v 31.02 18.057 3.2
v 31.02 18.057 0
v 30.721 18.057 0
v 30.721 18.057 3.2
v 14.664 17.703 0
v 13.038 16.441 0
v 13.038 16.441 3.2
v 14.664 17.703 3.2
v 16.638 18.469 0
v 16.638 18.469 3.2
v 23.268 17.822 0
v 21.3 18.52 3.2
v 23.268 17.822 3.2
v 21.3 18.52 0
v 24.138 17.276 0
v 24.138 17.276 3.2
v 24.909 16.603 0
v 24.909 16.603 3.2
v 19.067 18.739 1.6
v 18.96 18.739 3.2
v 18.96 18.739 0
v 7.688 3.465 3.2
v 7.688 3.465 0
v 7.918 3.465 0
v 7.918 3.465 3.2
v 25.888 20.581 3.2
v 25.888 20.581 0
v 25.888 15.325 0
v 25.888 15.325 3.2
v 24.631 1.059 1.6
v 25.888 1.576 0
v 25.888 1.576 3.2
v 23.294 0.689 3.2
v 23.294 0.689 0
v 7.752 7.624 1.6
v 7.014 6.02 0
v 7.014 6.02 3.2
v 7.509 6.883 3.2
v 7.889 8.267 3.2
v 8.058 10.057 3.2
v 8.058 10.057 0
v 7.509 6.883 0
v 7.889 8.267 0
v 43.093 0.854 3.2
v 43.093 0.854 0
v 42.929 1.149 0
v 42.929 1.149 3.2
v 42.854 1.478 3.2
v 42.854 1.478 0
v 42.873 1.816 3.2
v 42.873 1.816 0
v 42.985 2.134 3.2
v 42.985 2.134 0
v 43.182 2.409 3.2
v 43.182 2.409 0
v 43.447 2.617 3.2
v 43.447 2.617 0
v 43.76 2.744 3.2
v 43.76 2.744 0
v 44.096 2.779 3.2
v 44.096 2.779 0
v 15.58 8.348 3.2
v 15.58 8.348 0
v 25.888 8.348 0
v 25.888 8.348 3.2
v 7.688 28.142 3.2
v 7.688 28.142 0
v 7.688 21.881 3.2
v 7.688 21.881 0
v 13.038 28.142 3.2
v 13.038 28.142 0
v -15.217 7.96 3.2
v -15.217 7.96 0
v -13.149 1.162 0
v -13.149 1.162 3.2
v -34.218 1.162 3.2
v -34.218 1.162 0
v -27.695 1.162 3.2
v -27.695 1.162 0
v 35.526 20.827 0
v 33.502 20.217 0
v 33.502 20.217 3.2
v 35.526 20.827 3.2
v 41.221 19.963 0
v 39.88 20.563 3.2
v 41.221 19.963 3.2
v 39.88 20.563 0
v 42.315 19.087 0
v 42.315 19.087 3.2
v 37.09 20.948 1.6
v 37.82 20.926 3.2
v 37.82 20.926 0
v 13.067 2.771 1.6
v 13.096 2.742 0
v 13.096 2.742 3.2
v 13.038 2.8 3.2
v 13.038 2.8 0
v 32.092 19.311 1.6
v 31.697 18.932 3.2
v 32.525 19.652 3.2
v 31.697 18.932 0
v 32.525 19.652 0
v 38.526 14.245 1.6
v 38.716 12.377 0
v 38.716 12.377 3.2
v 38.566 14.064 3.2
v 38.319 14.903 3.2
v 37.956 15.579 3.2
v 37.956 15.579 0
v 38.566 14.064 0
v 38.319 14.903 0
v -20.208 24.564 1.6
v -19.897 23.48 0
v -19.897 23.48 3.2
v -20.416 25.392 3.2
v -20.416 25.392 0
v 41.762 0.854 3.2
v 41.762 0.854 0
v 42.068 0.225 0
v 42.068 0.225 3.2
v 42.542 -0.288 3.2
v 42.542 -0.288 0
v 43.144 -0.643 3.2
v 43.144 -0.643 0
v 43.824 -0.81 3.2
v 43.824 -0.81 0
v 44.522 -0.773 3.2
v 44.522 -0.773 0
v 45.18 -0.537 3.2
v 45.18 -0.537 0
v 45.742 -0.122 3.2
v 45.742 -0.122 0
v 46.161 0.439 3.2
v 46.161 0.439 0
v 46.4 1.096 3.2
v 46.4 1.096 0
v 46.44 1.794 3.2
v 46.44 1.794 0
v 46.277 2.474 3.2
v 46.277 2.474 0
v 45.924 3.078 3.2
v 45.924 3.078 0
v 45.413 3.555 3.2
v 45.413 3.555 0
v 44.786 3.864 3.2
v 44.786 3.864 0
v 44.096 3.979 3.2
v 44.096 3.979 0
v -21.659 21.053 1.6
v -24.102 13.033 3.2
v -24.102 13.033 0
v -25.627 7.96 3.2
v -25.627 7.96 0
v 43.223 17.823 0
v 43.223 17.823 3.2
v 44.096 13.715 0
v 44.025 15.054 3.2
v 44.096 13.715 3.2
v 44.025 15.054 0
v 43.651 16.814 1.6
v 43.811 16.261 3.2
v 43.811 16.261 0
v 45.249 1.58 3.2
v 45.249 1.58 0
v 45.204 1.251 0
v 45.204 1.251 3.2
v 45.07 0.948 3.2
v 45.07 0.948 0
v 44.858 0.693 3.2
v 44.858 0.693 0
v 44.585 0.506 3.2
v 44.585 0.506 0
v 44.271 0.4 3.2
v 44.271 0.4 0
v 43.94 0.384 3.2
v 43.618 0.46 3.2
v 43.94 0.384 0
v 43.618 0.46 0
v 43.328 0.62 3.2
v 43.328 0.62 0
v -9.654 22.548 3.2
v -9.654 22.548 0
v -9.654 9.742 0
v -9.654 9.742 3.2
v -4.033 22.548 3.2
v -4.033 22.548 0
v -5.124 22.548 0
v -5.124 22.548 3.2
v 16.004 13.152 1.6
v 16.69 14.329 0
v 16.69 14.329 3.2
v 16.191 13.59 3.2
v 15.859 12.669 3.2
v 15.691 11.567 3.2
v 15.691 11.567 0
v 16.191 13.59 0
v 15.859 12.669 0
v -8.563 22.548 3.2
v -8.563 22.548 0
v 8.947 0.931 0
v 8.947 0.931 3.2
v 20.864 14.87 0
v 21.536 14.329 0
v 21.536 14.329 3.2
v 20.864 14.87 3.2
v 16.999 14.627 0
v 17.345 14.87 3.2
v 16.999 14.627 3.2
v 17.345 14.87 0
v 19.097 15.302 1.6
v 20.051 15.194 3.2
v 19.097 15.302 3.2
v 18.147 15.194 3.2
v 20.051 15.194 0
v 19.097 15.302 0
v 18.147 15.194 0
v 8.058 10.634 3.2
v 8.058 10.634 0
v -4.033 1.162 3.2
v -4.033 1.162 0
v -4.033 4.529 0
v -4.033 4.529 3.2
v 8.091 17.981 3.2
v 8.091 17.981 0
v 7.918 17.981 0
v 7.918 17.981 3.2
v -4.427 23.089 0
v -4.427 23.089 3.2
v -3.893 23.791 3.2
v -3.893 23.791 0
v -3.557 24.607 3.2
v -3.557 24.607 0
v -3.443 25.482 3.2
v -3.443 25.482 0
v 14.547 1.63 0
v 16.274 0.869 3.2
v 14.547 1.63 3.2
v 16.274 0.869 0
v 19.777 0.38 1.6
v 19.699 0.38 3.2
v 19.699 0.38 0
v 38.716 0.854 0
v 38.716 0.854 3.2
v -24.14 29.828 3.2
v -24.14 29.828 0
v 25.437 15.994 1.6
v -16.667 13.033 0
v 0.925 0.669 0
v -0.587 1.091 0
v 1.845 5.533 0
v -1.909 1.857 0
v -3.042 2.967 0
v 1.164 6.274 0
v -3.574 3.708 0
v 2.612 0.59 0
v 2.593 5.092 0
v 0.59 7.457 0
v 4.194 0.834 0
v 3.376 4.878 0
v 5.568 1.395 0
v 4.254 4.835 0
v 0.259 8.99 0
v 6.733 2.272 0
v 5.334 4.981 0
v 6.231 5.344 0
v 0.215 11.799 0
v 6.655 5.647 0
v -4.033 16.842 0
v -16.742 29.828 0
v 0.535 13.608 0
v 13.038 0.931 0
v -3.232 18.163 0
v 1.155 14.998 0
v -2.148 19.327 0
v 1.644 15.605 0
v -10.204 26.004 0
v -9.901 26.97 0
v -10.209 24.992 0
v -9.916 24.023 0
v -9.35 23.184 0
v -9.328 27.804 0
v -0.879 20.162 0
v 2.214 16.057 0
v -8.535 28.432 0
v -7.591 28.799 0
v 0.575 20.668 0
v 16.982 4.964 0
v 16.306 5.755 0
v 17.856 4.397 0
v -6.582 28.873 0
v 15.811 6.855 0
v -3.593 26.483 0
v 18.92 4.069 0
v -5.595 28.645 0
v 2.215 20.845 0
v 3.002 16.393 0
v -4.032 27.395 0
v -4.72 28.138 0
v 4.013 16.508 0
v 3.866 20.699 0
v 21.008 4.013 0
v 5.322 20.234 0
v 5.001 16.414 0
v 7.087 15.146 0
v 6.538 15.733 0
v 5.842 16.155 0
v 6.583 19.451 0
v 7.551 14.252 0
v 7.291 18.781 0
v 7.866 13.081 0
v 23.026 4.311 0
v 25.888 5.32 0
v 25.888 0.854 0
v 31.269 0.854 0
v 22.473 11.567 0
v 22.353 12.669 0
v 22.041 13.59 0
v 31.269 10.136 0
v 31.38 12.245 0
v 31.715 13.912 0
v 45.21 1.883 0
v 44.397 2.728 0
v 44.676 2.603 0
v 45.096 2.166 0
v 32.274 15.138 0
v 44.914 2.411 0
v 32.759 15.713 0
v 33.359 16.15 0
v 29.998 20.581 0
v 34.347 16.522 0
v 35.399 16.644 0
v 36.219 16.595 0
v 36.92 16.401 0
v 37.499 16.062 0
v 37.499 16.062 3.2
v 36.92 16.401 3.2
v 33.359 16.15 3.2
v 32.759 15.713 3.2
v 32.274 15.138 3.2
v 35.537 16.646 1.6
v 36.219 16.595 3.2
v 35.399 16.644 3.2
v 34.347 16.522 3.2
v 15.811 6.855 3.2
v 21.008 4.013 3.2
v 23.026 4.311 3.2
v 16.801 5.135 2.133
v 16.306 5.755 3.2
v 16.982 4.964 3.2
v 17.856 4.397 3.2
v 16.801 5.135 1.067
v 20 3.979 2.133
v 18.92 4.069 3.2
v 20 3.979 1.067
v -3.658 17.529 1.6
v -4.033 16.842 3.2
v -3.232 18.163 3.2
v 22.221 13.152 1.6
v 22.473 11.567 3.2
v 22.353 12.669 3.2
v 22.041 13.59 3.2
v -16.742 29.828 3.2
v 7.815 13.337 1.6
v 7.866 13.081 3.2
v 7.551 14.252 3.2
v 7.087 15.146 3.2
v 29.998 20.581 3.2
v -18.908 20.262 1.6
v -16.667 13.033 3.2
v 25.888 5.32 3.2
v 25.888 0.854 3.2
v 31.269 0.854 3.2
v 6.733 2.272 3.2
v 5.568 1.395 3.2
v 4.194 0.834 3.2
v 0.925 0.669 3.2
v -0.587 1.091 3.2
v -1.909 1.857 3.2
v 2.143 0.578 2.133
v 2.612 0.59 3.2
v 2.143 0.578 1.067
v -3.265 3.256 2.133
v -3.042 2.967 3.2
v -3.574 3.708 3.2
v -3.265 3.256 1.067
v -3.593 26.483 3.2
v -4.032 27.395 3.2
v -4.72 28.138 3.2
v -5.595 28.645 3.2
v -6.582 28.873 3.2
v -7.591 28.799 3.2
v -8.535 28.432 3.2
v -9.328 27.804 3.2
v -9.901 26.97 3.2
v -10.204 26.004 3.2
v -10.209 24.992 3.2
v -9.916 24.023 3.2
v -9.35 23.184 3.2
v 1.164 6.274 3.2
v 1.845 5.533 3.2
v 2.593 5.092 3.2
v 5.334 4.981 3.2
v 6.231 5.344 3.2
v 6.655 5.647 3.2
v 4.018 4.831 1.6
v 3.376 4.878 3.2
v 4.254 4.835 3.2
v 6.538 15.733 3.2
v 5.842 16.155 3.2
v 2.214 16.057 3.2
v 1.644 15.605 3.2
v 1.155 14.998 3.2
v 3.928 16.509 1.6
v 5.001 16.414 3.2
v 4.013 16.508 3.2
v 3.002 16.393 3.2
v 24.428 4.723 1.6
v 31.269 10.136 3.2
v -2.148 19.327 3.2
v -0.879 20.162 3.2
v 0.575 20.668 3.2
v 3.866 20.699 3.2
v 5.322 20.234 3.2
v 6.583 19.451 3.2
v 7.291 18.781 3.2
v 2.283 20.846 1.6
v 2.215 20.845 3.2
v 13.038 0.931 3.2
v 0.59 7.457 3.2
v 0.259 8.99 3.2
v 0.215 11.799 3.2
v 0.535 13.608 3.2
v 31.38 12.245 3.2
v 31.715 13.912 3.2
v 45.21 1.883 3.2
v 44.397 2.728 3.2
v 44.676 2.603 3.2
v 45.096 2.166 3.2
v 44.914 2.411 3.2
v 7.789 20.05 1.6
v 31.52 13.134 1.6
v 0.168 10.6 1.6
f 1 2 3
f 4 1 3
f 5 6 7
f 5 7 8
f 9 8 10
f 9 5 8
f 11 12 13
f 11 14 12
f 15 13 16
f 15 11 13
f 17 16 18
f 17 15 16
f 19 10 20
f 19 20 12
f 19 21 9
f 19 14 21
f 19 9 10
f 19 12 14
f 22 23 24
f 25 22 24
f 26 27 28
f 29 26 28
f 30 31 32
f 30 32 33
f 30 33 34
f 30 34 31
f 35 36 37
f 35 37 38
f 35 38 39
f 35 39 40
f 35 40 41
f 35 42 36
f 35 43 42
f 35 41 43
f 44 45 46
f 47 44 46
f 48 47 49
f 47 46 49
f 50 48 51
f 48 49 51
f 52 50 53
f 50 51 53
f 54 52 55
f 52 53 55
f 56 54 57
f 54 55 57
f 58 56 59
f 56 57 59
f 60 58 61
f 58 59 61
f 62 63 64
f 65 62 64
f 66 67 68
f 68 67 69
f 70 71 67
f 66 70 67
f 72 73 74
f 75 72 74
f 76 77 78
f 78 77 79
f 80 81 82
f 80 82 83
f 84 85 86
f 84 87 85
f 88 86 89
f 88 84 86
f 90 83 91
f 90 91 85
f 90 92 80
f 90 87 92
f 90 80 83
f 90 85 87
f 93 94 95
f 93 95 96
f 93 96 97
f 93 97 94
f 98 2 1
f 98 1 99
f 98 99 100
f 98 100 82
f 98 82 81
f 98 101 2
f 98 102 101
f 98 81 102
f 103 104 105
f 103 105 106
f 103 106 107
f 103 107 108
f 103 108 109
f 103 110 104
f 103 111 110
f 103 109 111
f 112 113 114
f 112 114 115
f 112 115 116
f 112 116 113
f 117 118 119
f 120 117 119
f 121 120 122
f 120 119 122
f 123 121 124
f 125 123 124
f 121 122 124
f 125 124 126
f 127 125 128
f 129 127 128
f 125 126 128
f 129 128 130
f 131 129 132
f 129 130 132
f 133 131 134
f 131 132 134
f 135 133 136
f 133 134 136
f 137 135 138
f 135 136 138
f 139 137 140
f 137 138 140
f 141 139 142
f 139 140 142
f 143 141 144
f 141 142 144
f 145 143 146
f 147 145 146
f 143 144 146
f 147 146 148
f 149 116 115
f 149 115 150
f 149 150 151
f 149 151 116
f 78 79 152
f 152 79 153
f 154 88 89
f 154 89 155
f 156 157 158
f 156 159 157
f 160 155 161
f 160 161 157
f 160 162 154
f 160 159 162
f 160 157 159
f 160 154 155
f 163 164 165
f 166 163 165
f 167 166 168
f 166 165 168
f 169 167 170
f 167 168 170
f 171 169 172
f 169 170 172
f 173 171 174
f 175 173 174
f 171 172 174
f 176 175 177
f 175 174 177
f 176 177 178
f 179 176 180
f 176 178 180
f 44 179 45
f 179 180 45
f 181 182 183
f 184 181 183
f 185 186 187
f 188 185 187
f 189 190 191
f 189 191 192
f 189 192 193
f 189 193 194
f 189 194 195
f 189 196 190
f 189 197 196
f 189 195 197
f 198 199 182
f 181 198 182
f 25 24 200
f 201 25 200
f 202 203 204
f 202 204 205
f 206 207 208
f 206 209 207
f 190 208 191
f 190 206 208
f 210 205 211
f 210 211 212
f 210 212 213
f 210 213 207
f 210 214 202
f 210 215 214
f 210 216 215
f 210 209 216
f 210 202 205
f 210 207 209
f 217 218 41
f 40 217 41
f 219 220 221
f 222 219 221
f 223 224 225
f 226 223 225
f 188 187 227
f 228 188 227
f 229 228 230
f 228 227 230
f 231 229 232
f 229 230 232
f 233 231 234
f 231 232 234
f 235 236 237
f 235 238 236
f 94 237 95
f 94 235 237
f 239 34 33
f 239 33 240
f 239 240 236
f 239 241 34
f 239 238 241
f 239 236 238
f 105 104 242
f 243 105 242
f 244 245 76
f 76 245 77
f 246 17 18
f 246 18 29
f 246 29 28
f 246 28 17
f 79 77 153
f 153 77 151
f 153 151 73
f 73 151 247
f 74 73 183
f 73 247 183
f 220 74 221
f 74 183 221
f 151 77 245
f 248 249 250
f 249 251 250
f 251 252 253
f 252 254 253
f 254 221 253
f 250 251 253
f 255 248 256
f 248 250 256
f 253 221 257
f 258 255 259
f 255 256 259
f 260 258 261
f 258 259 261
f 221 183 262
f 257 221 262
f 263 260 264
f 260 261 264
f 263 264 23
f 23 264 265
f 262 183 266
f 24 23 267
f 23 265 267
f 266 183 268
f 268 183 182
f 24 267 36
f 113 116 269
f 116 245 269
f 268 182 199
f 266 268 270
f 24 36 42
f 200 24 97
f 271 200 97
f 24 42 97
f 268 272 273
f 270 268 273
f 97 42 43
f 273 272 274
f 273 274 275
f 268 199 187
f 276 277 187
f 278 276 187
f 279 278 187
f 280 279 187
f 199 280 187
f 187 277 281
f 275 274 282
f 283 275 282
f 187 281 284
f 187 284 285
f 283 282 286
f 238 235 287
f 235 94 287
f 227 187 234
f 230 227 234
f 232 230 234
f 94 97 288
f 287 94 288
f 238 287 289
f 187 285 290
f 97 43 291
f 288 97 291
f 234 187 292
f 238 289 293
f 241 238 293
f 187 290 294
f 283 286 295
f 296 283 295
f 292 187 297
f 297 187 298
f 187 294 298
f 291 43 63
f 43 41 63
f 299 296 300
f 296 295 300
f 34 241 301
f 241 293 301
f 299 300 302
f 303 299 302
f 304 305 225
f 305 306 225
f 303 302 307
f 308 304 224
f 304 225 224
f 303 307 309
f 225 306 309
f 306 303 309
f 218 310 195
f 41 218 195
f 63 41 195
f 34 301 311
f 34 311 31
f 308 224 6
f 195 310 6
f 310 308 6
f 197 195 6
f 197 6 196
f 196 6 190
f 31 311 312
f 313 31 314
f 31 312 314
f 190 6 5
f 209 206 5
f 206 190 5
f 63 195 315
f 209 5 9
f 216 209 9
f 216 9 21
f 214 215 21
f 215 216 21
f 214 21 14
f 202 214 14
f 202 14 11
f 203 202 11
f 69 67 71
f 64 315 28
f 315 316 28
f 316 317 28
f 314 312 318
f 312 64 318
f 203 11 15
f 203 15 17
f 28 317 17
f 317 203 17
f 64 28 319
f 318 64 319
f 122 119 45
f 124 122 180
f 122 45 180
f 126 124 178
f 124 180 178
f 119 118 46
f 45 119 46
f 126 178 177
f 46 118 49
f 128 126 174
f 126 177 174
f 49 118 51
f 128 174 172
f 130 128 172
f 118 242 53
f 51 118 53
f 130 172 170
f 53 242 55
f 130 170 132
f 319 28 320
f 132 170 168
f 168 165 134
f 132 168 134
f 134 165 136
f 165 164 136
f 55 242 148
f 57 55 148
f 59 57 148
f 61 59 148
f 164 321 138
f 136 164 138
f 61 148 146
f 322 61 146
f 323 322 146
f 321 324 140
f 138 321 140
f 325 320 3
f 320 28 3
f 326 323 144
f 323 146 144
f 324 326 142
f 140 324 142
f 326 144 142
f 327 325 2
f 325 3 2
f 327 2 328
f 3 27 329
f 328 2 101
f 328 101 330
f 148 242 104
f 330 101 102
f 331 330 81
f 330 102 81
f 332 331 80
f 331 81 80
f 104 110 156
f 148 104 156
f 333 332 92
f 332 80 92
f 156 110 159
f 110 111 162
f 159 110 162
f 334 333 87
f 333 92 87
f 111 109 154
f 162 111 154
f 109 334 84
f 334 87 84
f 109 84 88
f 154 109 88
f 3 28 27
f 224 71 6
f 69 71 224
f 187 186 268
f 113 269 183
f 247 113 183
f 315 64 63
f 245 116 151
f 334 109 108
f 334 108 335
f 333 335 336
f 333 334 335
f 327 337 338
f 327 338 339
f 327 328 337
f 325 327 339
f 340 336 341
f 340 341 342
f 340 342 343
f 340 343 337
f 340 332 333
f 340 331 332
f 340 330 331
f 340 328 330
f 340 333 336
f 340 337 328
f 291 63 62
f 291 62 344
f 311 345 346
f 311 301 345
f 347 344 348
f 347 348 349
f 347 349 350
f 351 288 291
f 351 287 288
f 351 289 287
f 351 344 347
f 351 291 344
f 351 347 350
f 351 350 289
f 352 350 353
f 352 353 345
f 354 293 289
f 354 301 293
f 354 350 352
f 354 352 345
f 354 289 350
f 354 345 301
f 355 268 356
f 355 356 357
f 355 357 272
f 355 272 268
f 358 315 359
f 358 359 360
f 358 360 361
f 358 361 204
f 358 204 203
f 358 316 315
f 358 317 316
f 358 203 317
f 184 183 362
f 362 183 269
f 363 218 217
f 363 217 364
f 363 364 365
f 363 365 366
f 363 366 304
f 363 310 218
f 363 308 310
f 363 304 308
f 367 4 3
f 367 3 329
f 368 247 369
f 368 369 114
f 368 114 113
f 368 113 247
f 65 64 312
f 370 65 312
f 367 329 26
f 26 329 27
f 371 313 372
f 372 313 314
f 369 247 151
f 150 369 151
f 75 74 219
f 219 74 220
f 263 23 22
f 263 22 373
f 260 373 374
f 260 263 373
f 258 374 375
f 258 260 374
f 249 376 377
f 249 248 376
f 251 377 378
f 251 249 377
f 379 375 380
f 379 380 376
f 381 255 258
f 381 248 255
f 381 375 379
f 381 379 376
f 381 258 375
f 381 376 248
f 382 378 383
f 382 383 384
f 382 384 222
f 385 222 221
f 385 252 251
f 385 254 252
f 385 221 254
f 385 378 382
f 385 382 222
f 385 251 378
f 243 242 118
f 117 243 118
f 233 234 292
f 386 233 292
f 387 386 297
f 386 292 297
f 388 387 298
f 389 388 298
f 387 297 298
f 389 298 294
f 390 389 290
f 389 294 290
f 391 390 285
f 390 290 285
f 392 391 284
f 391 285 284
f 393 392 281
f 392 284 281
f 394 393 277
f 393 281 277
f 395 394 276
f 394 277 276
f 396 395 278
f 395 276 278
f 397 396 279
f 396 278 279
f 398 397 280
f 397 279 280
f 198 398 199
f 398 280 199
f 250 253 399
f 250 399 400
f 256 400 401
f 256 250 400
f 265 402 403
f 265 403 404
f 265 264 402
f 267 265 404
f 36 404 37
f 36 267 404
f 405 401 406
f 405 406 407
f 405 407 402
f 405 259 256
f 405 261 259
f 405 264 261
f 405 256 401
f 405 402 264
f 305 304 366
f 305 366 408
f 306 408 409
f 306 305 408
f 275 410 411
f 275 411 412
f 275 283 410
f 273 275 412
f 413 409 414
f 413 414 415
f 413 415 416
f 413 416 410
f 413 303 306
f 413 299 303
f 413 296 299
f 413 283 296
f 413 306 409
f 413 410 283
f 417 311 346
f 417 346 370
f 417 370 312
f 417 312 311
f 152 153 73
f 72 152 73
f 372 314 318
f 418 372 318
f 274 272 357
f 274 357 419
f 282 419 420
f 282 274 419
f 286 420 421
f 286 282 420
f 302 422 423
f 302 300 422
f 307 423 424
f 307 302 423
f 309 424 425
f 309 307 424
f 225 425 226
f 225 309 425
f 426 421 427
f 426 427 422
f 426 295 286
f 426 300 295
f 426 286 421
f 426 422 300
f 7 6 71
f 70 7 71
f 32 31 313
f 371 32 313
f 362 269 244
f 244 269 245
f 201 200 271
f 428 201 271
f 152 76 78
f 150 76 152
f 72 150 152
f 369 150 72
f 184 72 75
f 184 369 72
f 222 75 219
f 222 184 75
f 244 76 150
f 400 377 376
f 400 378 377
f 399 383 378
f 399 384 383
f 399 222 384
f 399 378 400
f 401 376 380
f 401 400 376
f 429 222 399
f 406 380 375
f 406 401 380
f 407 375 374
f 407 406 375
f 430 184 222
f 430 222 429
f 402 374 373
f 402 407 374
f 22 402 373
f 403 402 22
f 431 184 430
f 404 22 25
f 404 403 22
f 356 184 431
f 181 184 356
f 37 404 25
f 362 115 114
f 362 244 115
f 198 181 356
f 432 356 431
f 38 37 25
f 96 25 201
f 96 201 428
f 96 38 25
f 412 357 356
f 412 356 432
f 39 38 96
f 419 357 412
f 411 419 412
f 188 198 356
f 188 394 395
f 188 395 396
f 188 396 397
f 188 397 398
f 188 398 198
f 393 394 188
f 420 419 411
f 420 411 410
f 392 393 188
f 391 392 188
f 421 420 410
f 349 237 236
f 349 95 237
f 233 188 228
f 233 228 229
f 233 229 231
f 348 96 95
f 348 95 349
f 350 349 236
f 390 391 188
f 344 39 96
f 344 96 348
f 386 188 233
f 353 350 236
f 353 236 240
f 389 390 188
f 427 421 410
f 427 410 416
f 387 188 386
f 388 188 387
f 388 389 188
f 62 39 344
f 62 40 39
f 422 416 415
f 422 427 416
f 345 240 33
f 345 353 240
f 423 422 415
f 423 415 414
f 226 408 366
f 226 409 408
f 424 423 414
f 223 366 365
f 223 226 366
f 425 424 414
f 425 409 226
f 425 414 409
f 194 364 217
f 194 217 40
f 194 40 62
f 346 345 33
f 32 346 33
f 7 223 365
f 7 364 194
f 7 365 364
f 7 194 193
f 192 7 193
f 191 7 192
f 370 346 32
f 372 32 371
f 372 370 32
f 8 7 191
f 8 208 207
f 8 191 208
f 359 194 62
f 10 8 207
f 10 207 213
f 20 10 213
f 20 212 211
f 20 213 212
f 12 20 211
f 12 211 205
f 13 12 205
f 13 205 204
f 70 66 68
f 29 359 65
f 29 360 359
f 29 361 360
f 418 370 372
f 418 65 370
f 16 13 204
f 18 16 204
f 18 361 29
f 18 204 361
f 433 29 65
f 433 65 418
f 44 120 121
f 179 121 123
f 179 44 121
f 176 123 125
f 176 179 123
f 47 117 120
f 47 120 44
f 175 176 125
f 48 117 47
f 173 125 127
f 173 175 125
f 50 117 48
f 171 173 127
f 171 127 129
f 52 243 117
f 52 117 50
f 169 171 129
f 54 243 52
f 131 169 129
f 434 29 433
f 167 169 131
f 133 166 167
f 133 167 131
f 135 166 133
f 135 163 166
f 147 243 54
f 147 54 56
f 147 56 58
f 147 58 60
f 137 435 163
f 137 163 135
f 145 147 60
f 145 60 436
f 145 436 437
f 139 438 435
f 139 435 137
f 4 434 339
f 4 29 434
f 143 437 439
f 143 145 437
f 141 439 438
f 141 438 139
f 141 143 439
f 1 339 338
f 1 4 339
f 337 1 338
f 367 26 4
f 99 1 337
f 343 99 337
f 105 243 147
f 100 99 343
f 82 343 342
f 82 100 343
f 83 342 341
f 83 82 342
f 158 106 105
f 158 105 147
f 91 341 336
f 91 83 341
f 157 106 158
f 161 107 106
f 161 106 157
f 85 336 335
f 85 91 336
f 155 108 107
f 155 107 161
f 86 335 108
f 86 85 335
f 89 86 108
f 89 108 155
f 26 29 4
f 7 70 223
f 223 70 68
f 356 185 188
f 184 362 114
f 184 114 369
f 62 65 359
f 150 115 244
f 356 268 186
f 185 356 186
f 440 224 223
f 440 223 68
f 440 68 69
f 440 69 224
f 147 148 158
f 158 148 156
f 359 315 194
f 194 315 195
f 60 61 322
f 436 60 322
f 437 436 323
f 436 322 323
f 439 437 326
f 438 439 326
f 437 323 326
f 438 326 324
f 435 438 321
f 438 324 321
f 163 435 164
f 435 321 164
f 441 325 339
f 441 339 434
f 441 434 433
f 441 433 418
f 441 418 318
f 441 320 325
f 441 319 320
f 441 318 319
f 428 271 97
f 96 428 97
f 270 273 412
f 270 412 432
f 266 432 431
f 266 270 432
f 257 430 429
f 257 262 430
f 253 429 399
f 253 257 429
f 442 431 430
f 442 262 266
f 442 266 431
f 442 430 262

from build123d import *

# Parameters (mm, degrees)
F1_DEPTH = 4
F2_SCALE = 0.8


with BuildPart() as f1:
    # F0 (on Top) → F1 (new body)
    with BuildSketch(Plane.XY):
        with BuildLine():
            ThreePointArc((2.1488346381, 27.8940834105), (3.6881804127, 29.448172395), (4.2509673702, 31.561948359))
            ThreePointArc((4.2509673702, 31.561948359), (-2.113775964, 35.2501287717), (-2.1488346381, 27.8940834105))
            Line((-2.1488346381, 27.8940834105), (2.1488346381, 27.8940834105))
        make_face()
        with BuildLine():
            Line((2.1488346381, 27.8940834105), (-2.1488346381, 27.8940834105))
            ThreePointArc((-2.1488346381, 27.8940834105), (0, 27.3109809888), (2.1488346381, 27.8940834105))
        make_face()
        with BuildLine():
            ThreePointArc((2.1488346381, 27.8940834105), (0, 27.3109809888), (-2.1488346381, 27.8940834105))
            Line((-2.1488346381, 27.8940834105), (-3.5128553864, 27.8940834105))
            Line((-3.5128553864, 27.8940834105), (-3.5128553864, 11.8866187867))
            Line((-3.5128553864, 11.8866187867), (0.2716600963, 1.1618769495))
            Line((0.2716600963, 1.1618769495), (3.5128553864, 1.1618769495))
            Line((3.5128553864, 1.1618769495), (3.5128553864, 5.3711547468))
            add(Edge.make_bspline(
                [(3.5128553864, 5.3711547468), (2.0144434893, 8.4253364224), (2.0144434893, 13.0503994181)],
                knots=[0.2193225388, 0.2193225388, 0.2193225388, 1, 1, 1], degree=2))
            add(Edge.make_bspline(
                [(2.0144434893, 13.0503994181), (2.0144434893, 17.7014605477), (3.5128553864, 20.7618998173)],
                knots=[0, 0, 0, 0.7740986013, 0.7740986013, 0.7740986013], degree=2))
            Line((3.5128553864, 20.7618998173), (3.5128553864, 27.8940834105))
            Line((3.5128553864, 27.8940834105), (2.1488346381, 27.8940834105))
        make_face()
        Polygon((0.2716600963, 1.1618769495), (-3.5128553864, 11.8866187867), (-3.5128553864, 1.1618769495), align=None)
        Polygon((-3.5128553864, 1.1618769495), (-3.5128553864, 11.8866187867), (-12.3729065895, 36.9946576501), (-21.6200758025, 36.9946576501), (-34.2177818335, 1.1618769495), (-26.064027899, 1.1618769495), (-23.4788817761, 9.6592756858), (-10.4672399611, 9.6592756858), (-7.8820938382, 1.1618769495), align=None)
        with BuildLine():
            add(Edge.make_bspline(
                [(-12.2791852799, 16.0010843015), (-15.8640253718, 27.5444255996), (-16.3170117015, 29.0595867713)],
                knots=[0, 0, 0, 1, 1, 1], degree=2))
            Line((-12.2791852799, 16.0010843015), (-21.5732151477, 16.0010843015))
            add(Edge.make_bspline(
                [(-16.9652507595, 31.4494801659), (-17.7696920001, 28.3254365129), (-21.5732151477, 16.0010843015)],
                knots=[0, 0, 0, 1, 1, 1], degree=2))
            add(Edge.make_bspline(
                [(-16.3170117015, 29.0595867713), (-16.7699980311, 30.5747479431), (-16.9652507595, 31.4494801659)],
                knots=[0, 0, 0, 1, 1, 1], degree=2))
        make_face(mode=Mode.SUBTRACT)
        with BuildLine():
            add(Edge.make_bspline(
                [(3.5128553864, 20.7618998173), (3.9501295822, 21.6550128013), (4.5150113623, 22.4126654266)],
                knots=[0.7740986013, 0.7740986013, 0.7740986013, 1, 1, 1], degree=2))
            Line((3.5128553864, 20.7618998173), (3.5128553864, 5.3711547468))
            add(Edge.make_bspline(
                [(4.4730437896, 3.7790631505), (3.9338173299, 4.513116809), (3.5128553864, 5.3711547468)],
                knots=[0, 0, 0, 0.2193225388, 0.2193225388, 0.2193225388], degree=2))
            add(Edge.make_bspline(
                [(11.2333202911, 0.4321492281), (6.93164409, 0.4321492281), (4.4730437896, 3.7790631505)],
                knots=[0, 0, 0, 1, 1, 1], degree=2))
            add(Edge.make_bspline(
                [(18.1649643811, 4.0413604798), (15.8917208602, 0.4321492281), (11.2333202911, 0.4321492281)],
                knots=[0, 0, 0, 1, 1, 1], degree=2))
            Line((18.1649643811, 4.0413604798), (18.4517427945, 4.0413604798))
            Line((18.4517427945, 4.0413604798), (19.7387483571, 0.8728087414))
            Line((19.7387483571, 0.8728087414), (24.8517976303, 0.8728087414))
            Line((24.8517976303, 0.8728087414), (24.8517976303, 3.2092719333))
            add(Edge.make_bspline(
                [(24.8517976303, 3.2092719333), (21.9149770273, 6.1553586181), (21.9149770273, 11.4941812468)],
                knots=[0.0121583181, 0.0121583181, 0.0121583181, 1, 1, 1], degree=2))
            add(Edge.make_bspline(
                [(21.9149770273, 11.4941812468), (21.9149770273, 17.0571116946), (24.6964422512, 20.0951813411)],
                knots=[0, 0, 0, 1, 1, 1], degree=2))
            add(Edge.make_bspline(
                [(24.6964422512, 20.0951813411), (24.7733070611, 20.1791373237), (24.8517976303, 20.2607732124)],
                knots=[0, 0, 0, 0.0276346471, 0.0276346471, 0.0276346471], degree=2))
            Line((24.8517976303, 20.2607732124), (24.8517976303, 34.88752641))
            Line((24.8517976303, 34.88752641), (18.1649643811, 34.88752641))
            Line((18.1649643811, 34.88752641), (18.1649643811, 27.0605741025))
            add(Edge.make_bspline(
                [(18.6685752534, 22.1853410745), (18.1649643811, 24.9202278951), (18.1649643811, 27.0605741025)],
                knots=[0, 0, 0, 1, 1, 1], degree=2))
            Line((18.6685752534, 22.1853410745), (18.4517427945, 22.1853410745))
            add(Edge.make_bspline(
                [(11.4081851773, 25.7665739444), (16.0246181737, 25.7665739444), (18.4517427945, 22.1853410745)],
                knots=[0, 0, 0, 1, 1, 1], degree=2))
            add(Edge.make_bspline(
                [(4.5150113623, 22.4126654266), (7.0155792354, 25.7665739444), (11.4081851773, 25.7665739444)],
                knots=[0, 0, 0, 1, 1, 1], degree=2))
        make_face()
        with BuildLine():
            add(Edge.make_bspline(
                [(13.5765097665, 5.7480417694), (16.1295371054, 5.7480417694), (17.3221156295, 7.2343933023)],
                knots=[0, 0, 0, 1, 1, 1], degree=2))
            add(Edge.make_bspline(
                [(10.0092660875, 7.5526473952), (11.2543040775, 5.7480417694), (13.5765097665, 5.7480417694)],
                knots=[0, 0, 0, 1, 1, 1], degree=2))
            add(Edge.make_bspline(
                [(8.7642280976, 12.9594696773), (8.7642280976, 9.3572530211), (10.0092660875, 7.5526473952)],
                knots=[0, 0, 0, 1, 1, 1], degree=2))
            add(Edge.make_bspline(
                [(9.9987741944, 18.4572217002), (8.7642280976, 16.568680929), (8.7642280976, 12.9594696773)],
                knots=[0, 0, 0, 1, 1, 1], degree=2))
            add(Edge.make_bspline(
                [(13.4645962393, 20.3457624715), (11.2333202911, 20.3457624715), (9.9987741944, 18.4572217002)],
                knots=[0, 0, 0, 1, 1, 1], degree=2))
            add(Edge.make_bspline(
                [(17.4130453703, 18.6425784796), (16.1994830599, 20.3457624715), (13.4645962393, 20.3457624715)],
                knots=[0, 0, 0, 1, 1, 1], degree=2))
            add(Edge.make_bspline(
                [(18.6266076807, 13.00143725), (18.6266076807, 16.9393944878), (17.4130453703, 18.6425784796)],
                knots=[0, 0, 0, 1, 1, 1], degree=2))
            Line((18.6266076807, 13.00143725), (18.6266076807, 12.2809939187))
            add(Edge.make_bspline(
                [(17.3221156295, 7.2343933023), (18.5146941535, 8.7207448352), (18.6266076807, 12.2809939187)],
                knots=[0, 0, 0, 1, 1, 1], degree=2))
        make_face(mode=Mode.SUBTRACT)
        with BuildLine():
            Line((3.5128553864, 5.3711547468), (3.5128553864, 20.7618998173))
            add(Edge.make_bspline(
                [(2.0144434893, 13.0503994181), (2.0144434893, 17.7014605477), (3.5128553864, 20.7618998173)],
                knots=[0, 0, 0, 0.7740986013, 0.7740986013, 0.7740986013], degree=2))
            add(Edge.make_bspline(
                [(3.5128553864, 5.3711547468), (2.0144434893, 8.4253364224), (2.0144434893, 13.0503994181)],
                knots=[0.2193225388, 0.2193225388, 0.2193225388, 1, 1, 1], degree=2))
        make_face()
        with BuildLine():
            add(Edge.make_bspline(
                [(24.8517976303, 3.2092719333), (21.9149770273, 6.1553586181), (21.9149770273, 11.4941812468)],
                knots=[0.0121583181, 0.0121583181, 0.0121583181, 1, 1, 1], degree=2))
            Line((24.8517976303, 3.2092719333), (24.8517976303, 20.2607732124))
            add(Edge.make_bspline(
                [(24.6964422512, 20.0951813411), (24.7733070611, 20.1791373237), (24.8517976303, 20.2607732124)],
                knots=[0, 0, 0, 0.0276346471, 0.0276346471, 0.0276346471], degree=2))
            add(Edge.make_bspline(
                [(21.9149770273, 11.4941812468), (21.9149770273, 17.0571116946), (24.6964422512, 20.0951813411)],
                knots=[0, 0, 0, 1, 1, 1], degree=2))
        make_face()
        with BuildLine():
            Line((24.8517976303, 20.2607732124), (24.8517976303, 3.2092719333))
            add(Edge.make_bspline(
                [(24.9245350714, 3.1371137519), (24.8879439074, 3.1730116097), (24.8517976303, 3.2092719333)],
                knots=[0, 0, 0, 0.0121583181, 0.0121583181, 0.0121583181], degree=2))
            add(Edge.make_bspline(
                [(33.2752666546, 0.1845789129), (27.9340931154, 0.1845789129), (24.9245350714, 3.1371137519)],
                knots=[0, 0, 0, 1, 1, 1], degree=2))
            add(Edge.make_bspline(
                [(37.6723893548, 0.5710695249), (35.87299044, 0.1845789129), (33.2752666546, 0.1845789129)],
                knots=[0, 0, 0, 1, 1, 1], degree=2))
            add(Edge.make_bspline(
                [(40.9146455919, 1.6800010707), (39.3918731171, 0.9403952626), (37.6723893548, 0.5710695249)],
                knots=[0.0444121377, 0.0444121377, 0.0444121377, 1, 1, 1], degree=2))
            Line((40.9146455919, 1.6800010707), (40.9146455919, 6.3596039359))
            add(Edge.make_bspline(
                [(37.3365860362, 5.0980784143), (39.0520850304, 5.4979545144), (40.9146455919, 6.3596039359)],
                knots=[0, 0, 0, 0.963551726, 0.963551726, 0.963551726], degree=2))
            add(Edge.make_bspline(
                [(33.5540467682, 4.6830761998), (35.5561948564, 4.6830761998), (37.3365860362, 5.0980784143)],
                knots=[0, 0, 0, 1, 1, 1], degree=2))
            add(Edge.make_bspline(
                [(29.5560865034, 6.1276640609), (30.9816666295, 4.6830761998), (33.5540467682, 4.6830761998)],
                knots=[0, 0, 0, 1, 1, 1], degree=2))
            add(Edge.make_bspline(
                [(28.0291317905, 10.1446320608), (28.1305063772, 7.5722519221), (29.5560865034, 6.1276640609)],
                knots=[0, 0, 0, 1, 1, 1], degree=2))
            Line((28.0291317905, 10.1446320608), (40.9146455919, 10.1446320608))
            Line((40.9146455919, 10.1446320608), (40.9146455919, 18.8657178217))
            add(Edge.make_bspline(
                [(39.6903772222, 20.4626642181), (40.3984195191, 19.7391737256), (40.9146455919, 18.8657178217)],
                knots=[0, 0, 0, 0.2709106855, 0.2709106855, 0.2709106855], degree=2))
            add(Edge.make_bspline(
                [(32.3882390206, 23.1332509877), (37.0768136576, 23.1332509877), (39.6903772222, 20.4626642181)],
                knots=[0, 0, 0, 1, 1, 1], degree=2))
            add(Edge.make_bspline(
                [(24.8517976303, 20.2607732124), (27.6136027546, 23.1332509877), (32.3882390206, 23.1332509877)],
                knots=[0.0276346471, 0.0276346471, 0.0276346471, 1, 1, 1], degree=2))
        make_face()
        with BuildLine():
            add(Edge.make_bspline(
                [(32.4262544906, 18.8375028743), (30.5064732541, 18.8375028743), (29.4166964466, 17.6210078333)],
                knots=[0, 0, 0, 1, 1, 1], degree=2))
            add(Edge.make_bspline(
                [(35.4738280047, 17.6210078333), (34.3460357271, 18.8375028743), (32.4262544906, 18.8375028743)],
                knots=[0, 0, 0, 1, 1, 1], degree=2))
            add(Edge.make_bspline(
                [(36.645971664, 14.1679359723), (36.6016202823, 16.4045127924), (35.4738280047, 17.6210078333)],
                knots=[0, 0, 0, 1, 1, 1], degree=2))
            Line((36.645971664, 14.1679359723), (28.1685218473, 14.1679359723))
            add(Edge.make_bspline(
                [(29.4166964466, 17.6210078333), (28.3269196391, 16.4045127924), (28.1685218473, 14.1679359723)],
                knots=[0, 0, 0, 1, 1, 1], degree=2))
        make_face(mode=Mode.SUBTRACT)
        with BuildLine():
            Line((40.9146455919, 25.4354721989), (40.9146455919, 18.8657178217))
            add(Edge.make_bspline(
                [(40.9146455919, 18.8657178217), (42.3039407867, 16.5150266148), (42.3039407867, 13.0781591648)],
                knots=[0.2709106855, 0.2709106855, 0.2709106855, 1, 1, 1], degree=2))
            Line((42.3039407867, 13.0781591648), (42.3039407867, 10.1446320608))
            Line((42.3039407867, 10.1446320608), (40.9146455919, 10.1446320608))
            Line((40.9146455919, 10.1446320608), (40.9146455919, 6.3596039359))
            add(Edge.make_bspline(
                [(40.9146455919, 6.3596039359), (40.9851006758, 6.3921975511), (41.0557661874, 6.4254519095)],
                knots=[0.963551726, 0.963551726, 0.963551726, 1, 1, 1], degree=2))
            Line((41.0557661874, 6.4254519095), (41.0557661874, 1.7495490958))
            add(Edge.make_bspline(
                [(41.0557661874, 1.7495490958), (40.985418342, 1.7143751731), (40.9146455919, 1.6800010707)],
                knots=[0, 0, 0, 0.0444121377, 0.0444121377, 0.0444121377], degree=2))
            Line((40.9146455919, 1.6800010707), (40.9146455919, 0.7771677338))
            Line((40.9146455919, 0.7771677338), (47.6402792941, 0.7771677338))
            Line((47.6402792941, 0.7771677338), (47.6402792941, 12.3794151696))
            add(Edge.make_bspline(
                [(48.8964837001, 18.6322078874), (47.6402792941, 16.7479012783), (47.6402792941, 12.3794151696)],
                knots=[0, 0, 0, 1, 1, 1], degree=2))
            add(Edge.make_bspline(
                [(52.9756193558, 20.5165144965), (50.1526881062, 20.5165144965), (48.8964837001, 18.6322078874)],
                knots=[0, 0, 0, 1, 1, 1], degree=2))
            add(Edge.make_bspline(
                [(55.9996844569, 19.1826794811), (55.0504738242, 20.5165144965), (52.9756193558, 20.5165144965)],
                knots=[0, 0, 0, 1, 1, 1], degree=2))
            add(Edge.make_bspline(
                [(56.9488950896, 15.1811744348), (56.9488950896, 17.8488444656), (55.9996844569, 19.1826794811)],
                knots=[0, 0, 0, 1, 1, 1], degree=2))
            Line((56.9488950896, 15.1811744348), (56.9488950896, 0.7771677338))
            Line((56.9488950896, 0.7771677338), (60.7564002275, 0.7771677338))
            Line((60.7564002275, 0.7771677338), (62.4211823132, 0.7771677338))
            ThreePointArc((62.4211823132, 0.7771677338), (62.2858076042, 2.3770103555), (63.6745287917, 3.182787117))
            Line((63.6745287917, 3.182787117), (63.6745287917, 4.6833568017))
            Line((63.6745287917, 4.6833568017), (63.6745287917, 16.8537612002))
            add(Edge.make_bspline(
                [(61.4479417686, 23.5688089101), (63.6745287917, 21.2434192933), (63.6745287917, 16.8537612002)],
                knots=[0, 0, 0, 1, 1, 1], degree=2))
            add(Edge.make_bspline(
                [(54.9163845899, 25.894198527), (59.2213547455, 25.894198527), (61.4479417686, 23.5688089101)],
                knots=[0, 0, 0, 1, 1, 1], degree=2))
            add(Edge.make_bspline(
                [(50.4314525671, 24.9802745349), (52.4039757778, 25.894198527), (54.9163845899, 25.894198527)],
                knots=[0, 0, 0, 1, 1, 1], degree=2))
            add(Edge.make_bspline(
                [(47.3297568566, 22.2808465275), (48.4589293565, 24.0663505429), (50.4314525671, 24.9802745349)],
                knots=[0, 0, 0, 1, 1, 1], degree=2))
            Line((47.3297568566, 22.2808465275), (46.9557184661, 22.2808465275))
            Line((46.9557184661, 22.2808465275), (46.0523804662, 25.4354721989))
            Line((46.0523804662, 25.4354721989), (40.9146455919, 25.4354721989))
        make_face()
        with BuildLine():
            add(Edge.make_bspline(
                [(40.9146455919, 18.8657178217), (42.3039407867, 16.5150266148), (42.3039407867, 13.0781591648)],
                knots=[0.2709106855, 0.2709106855, 0.2709106855, 1, 1, 1], degree=2))
            Line((40.9146455919, 18.8657178217), (40.9146455919, 10.1446320608))
            Line((40.9146455919, 10.1446320608), (42.3039407867, 10.1446320608))
            Line((42.3039407867, 10.1446320608), (42.3039407867, 13.0781591648))
        make_face()
        with BuildLine():
            Line((40.9146455919, 6.3596039359), (40.9146455919, 1.6800010707))
            add(Edge.make_bspline(
                [(41.0557661874, 1.7495490958), (40.985418342, 1.7143751731), (40.9146455919, 1.6800010707)],
                knots=[0, 0, 0, 0.0444121377, 0.0444121377, 0.0444121377], degree=2))
            Line((41.0557661874, 1.7495490958), (41.0557661874, 6.4254519095))
            add(Edge.make_bspline(
                [(40.9146455919, 6.3596039359), (40.9851006758, 6.3921975511), (41.0557661874, 6.4254519095)],
                knots=[0.963551726, 0.963551726, 0.963551726, 1, 1, 1], degree=2))
        make_face()
        with BuildLine():
            ThreePointArc((60.7564002275, 0.7771677338), (66.0194795954, -0.111536961), (63.6745287917, 4.6833568017))
            Line((63.6745287917, 4.6833568017), (63.6745287917, 3.182787117))
            ThreePointArc((63.6745287917, 3.182787117), (64.697209834, 2.7237175484), (65.1160836284, 1.6839261619))
            ThreePointArc((65.1160836284, 1.6839261619), (64.0944391589, 0.2622454711), (62.4211823132, 0.7771677338))
            Line((62.4211823132, 0.7771677338), (60.7564002275, 0.7771677338))
        make_face()
    extrude(amount=F1_DEPTH)


with BuildPart() as f1_1:
    # F2: moved
    add(f1.part.scale(F2_SCALE).moved(Location((-6.8435563667, 0.2323753899, 0))))


solid = f1_1.part
